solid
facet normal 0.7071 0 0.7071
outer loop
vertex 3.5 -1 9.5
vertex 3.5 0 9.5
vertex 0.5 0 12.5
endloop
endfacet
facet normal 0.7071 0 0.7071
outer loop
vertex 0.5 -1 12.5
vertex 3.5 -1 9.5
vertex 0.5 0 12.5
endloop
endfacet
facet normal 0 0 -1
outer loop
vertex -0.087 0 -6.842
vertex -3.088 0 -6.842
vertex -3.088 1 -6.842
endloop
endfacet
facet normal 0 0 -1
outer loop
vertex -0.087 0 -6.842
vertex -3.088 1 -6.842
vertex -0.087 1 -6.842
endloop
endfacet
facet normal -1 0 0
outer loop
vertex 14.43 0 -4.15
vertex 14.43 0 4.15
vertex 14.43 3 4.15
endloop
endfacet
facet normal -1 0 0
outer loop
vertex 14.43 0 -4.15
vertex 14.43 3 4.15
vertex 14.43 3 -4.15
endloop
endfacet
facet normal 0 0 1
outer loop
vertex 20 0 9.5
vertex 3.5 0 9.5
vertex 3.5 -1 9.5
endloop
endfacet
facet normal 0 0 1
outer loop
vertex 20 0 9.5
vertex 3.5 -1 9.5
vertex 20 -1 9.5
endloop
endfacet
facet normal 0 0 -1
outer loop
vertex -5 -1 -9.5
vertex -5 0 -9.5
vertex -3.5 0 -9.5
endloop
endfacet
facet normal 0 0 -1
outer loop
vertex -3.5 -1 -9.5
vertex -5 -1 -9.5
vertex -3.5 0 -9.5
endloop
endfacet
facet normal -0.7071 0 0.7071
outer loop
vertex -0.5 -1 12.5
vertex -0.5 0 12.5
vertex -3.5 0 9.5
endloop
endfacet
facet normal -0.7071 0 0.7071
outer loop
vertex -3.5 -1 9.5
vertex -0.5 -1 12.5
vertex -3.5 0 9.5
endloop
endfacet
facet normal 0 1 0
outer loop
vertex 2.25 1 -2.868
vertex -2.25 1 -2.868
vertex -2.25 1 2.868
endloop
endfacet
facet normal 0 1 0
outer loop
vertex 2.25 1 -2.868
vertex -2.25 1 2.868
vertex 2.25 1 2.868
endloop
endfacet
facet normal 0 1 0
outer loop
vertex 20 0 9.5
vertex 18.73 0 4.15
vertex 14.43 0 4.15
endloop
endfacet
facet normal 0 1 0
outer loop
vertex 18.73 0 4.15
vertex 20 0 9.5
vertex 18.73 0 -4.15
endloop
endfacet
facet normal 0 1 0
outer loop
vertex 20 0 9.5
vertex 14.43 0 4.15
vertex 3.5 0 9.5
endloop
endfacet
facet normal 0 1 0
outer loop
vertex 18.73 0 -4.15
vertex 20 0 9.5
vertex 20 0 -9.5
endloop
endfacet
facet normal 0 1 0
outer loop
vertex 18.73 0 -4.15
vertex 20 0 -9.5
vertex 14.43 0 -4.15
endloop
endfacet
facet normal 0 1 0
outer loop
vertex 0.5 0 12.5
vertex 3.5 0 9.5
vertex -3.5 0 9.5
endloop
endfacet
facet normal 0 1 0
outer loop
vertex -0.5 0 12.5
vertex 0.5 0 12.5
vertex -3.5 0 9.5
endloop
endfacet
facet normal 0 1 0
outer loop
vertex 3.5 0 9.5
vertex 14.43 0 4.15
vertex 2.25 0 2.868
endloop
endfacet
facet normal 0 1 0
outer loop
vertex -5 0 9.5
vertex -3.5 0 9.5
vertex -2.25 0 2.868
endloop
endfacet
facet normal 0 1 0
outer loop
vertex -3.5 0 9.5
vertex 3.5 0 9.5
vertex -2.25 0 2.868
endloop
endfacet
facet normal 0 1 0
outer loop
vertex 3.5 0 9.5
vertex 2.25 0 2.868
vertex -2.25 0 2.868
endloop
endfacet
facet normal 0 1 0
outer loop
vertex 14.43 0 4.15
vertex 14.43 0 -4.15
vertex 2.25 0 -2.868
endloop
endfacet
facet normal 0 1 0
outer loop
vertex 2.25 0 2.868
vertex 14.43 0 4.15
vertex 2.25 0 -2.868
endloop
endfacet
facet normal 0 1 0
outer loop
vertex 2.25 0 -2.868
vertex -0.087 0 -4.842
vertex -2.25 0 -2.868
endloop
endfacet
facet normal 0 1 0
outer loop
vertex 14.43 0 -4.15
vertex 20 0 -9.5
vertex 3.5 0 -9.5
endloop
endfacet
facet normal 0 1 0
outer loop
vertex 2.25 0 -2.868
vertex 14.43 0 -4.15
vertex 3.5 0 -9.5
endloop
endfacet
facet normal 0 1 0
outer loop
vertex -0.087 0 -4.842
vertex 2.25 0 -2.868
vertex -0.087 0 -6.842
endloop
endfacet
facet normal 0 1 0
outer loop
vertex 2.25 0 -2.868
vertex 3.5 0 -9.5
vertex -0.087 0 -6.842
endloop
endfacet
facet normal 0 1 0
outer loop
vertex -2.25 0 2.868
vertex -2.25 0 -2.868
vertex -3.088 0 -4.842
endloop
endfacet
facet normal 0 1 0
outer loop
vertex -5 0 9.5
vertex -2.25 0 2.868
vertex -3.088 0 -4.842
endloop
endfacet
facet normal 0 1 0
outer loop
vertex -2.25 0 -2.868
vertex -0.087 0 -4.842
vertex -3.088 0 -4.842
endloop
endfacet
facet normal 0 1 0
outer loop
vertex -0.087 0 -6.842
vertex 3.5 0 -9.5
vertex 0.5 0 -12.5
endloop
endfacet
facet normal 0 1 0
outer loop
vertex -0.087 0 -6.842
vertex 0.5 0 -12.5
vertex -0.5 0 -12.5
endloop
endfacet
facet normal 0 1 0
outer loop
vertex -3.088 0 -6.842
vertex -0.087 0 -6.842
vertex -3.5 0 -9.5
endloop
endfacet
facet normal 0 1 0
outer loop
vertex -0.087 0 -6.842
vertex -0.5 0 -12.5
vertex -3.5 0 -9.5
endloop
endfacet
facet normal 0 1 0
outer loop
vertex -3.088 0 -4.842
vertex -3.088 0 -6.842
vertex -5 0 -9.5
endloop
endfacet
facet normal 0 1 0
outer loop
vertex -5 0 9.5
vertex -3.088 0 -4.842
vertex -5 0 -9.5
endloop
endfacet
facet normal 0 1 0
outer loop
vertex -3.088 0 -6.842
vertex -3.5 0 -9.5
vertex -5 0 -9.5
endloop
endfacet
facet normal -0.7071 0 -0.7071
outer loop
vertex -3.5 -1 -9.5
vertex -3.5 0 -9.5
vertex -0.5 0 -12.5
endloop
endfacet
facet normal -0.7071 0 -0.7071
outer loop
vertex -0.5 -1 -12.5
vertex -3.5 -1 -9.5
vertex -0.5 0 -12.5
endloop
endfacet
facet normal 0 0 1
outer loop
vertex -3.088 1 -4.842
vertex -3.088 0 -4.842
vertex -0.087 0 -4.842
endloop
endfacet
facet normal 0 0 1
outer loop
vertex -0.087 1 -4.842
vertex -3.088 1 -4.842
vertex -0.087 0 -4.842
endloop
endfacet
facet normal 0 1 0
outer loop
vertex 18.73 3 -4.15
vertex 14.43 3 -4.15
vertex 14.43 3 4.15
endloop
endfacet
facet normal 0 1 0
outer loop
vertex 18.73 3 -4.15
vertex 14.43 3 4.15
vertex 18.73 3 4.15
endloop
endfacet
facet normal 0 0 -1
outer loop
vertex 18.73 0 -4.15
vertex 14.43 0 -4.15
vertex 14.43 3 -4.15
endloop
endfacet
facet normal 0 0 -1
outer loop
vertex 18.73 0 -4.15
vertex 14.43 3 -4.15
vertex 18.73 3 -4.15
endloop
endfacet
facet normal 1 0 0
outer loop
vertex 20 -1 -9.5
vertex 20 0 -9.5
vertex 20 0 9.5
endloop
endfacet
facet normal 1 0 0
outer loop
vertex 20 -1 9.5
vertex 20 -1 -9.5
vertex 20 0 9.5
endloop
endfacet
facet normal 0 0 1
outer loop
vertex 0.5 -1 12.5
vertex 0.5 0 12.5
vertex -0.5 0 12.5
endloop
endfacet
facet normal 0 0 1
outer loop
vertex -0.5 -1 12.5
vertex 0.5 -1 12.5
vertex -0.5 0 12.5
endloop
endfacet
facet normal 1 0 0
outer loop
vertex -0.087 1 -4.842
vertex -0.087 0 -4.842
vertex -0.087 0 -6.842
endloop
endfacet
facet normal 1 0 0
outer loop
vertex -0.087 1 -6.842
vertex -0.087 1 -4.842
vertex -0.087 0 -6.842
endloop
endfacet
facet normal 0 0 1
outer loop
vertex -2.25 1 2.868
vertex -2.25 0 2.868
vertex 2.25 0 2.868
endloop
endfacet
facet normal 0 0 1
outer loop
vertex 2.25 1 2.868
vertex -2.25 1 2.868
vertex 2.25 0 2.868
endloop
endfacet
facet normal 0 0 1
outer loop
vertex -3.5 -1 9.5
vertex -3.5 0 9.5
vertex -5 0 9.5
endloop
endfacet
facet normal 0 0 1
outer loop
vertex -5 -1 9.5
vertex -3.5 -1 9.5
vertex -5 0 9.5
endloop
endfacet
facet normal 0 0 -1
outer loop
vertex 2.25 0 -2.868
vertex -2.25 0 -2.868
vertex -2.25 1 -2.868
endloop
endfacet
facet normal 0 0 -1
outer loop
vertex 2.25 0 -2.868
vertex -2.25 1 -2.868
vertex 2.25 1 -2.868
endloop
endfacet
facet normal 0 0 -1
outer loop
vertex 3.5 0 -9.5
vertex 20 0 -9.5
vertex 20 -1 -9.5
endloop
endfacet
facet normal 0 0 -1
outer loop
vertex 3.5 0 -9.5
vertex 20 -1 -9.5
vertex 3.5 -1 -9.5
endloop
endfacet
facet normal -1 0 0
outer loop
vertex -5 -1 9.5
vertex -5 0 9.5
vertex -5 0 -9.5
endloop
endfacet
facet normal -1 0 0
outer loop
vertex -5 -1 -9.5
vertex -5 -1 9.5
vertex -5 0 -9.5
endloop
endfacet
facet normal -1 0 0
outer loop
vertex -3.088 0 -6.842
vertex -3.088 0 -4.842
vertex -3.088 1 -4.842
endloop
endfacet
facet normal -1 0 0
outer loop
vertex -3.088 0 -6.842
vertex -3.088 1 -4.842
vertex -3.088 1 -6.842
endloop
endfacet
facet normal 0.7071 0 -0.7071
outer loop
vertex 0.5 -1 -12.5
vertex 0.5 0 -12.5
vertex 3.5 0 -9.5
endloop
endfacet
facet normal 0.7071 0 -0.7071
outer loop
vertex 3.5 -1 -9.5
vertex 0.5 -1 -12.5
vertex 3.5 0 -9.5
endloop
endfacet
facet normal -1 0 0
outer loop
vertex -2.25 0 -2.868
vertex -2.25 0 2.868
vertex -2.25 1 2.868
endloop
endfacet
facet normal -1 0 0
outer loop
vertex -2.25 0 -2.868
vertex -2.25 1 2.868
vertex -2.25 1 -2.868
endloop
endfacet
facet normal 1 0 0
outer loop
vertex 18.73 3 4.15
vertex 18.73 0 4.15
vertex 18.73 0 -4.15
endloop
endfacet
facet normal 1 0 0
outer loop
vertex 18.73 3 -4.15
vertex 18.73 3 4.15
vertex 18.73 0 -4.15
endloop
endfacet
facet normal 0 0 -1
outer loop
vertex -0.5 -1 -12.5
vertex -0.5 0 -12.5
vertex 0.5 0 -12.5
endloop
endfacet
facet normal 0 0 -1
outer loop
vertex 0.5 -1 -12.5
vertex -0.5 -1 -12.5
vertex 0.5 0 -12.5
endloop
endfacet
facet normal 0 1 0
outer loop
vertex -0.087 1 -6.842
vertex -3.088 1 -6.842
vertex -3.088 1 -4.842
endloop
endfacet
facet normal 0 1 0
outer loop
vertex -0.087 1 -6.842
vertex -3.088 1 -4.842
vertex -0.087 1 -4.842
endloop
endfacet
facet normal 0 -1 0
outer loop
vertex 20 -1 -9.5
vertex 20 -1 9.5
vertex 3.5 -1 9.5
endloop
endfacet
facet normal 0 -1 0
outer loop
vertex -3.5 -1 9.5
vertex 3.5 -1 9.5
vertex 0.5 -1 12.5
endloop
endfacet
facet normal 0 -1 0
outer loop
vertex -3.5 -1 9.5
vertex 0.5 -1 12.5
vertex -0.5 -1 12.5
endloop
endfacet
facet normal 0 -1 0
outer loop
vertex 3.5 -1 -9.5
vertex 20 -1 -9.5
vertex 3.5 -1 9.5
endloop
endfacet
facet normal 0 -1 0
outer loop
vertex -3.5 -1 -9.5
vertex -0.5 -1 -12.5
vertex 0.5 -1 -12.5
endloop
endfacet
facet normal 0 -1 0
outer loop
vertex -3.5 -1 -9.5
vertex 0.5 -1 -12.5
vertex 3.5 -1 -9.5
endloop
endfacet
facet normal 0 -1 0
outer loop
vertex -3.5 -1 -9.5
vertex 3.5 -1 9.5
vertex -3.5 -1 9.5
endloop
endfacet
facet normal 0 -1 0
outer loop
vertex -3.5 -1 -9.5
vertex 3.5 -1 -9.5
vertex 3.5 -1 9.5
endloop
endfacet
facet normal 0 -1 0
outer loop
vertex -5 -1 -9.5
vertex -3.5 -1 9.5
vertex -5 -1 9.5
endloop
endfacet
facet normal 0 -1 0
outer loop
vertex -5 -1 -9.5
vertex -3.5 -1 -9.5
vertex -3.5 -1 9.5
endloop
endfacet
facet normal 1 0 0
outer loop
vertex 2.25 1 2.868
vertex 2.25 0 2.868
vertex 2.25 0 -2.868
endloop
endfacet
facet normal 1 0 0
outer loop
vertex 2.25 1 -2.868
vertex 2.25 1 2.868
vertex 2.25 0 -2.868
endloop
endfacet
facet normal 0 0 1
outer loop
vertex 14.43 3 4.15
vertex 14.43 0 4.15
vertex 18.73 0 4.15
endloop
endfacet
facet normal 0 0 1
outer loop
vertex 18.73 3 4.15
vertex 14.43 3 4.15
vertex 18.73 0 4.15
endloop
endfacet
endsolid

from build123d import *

# Parameters (mm, degrees)
BOSS_EXTRUDE1_DEPTH = 1.000000032
SKETCH2_W           = 4.49999989
SKETCH2_H           = 5.735208424
SKETCH2_W_2         = 3
SKETCH2_H_2         = 2
BOSS_EXTRUDE2_DEPTH = 1
SKETCH3_W           = 4.300000036
SKETCH3_H           = 8.29999991
BOSS_EXTRUDE3_DEPTH = 3.000000096


with BuildPart() as part:
    # Sketch1 → Boss-Extrude1 (new body)
    with BuildSketch(Plane(origin=(0, 0, 0), x_dir=(1, 0, 0), z_dir=(0, 1, 0))):
        Polygon((-3.499999985, 9.50000005), (-0.499999889, 12.500000146), (0.499999889, 12.500000146), (3.499999985, 9.50000005), (4.999999906, 9.50000005), (20.000000132, 9.50000005), (20.000000132, -9.50000005), (4.999999906, -9.50000005), (3.499999985, -9.50000005), (0.499999889, -12.500000146), (-0.499999889, -12.500000146), (-3.499999985, -9.50000005), (-4.999999906, -9.50000005), (-4.999999906, 9.50000005), align=None)
    extrude(amount=-BOSS_EXTRUDE1_DEPTH)

    # Sketch2 → Boss-Extrude2 (add)
    with BuildSketch(Plane(origin=(0, 0, 0), x_dir=(1, 0, 0), z_dir=(0, 1, 0))):
        Rectangle(SKETCH2_W, SKETCH2_H)
        with Locations((-1.5875, 5.842)):
            Rectangle(SKETCH2_W_2, SKETCH2_H_2)
    extrude(amount=BOSS_EXTRUDE2_DEPTH)

    # Sketch3 → Boss-Extrude3 (add)
    with BuildSketch(Plane(origin=(0, 0, 0), x_dir=(1, 0, 0), z_dir=(0, 1, 0))):
        with Locations((16.580000114, 0)):
            Rectangle(SKETCH3_W, SKETCH3_H)
    extrude(amount=BOSS_EXTRUDE3_DEPTH)


solid = part.part
